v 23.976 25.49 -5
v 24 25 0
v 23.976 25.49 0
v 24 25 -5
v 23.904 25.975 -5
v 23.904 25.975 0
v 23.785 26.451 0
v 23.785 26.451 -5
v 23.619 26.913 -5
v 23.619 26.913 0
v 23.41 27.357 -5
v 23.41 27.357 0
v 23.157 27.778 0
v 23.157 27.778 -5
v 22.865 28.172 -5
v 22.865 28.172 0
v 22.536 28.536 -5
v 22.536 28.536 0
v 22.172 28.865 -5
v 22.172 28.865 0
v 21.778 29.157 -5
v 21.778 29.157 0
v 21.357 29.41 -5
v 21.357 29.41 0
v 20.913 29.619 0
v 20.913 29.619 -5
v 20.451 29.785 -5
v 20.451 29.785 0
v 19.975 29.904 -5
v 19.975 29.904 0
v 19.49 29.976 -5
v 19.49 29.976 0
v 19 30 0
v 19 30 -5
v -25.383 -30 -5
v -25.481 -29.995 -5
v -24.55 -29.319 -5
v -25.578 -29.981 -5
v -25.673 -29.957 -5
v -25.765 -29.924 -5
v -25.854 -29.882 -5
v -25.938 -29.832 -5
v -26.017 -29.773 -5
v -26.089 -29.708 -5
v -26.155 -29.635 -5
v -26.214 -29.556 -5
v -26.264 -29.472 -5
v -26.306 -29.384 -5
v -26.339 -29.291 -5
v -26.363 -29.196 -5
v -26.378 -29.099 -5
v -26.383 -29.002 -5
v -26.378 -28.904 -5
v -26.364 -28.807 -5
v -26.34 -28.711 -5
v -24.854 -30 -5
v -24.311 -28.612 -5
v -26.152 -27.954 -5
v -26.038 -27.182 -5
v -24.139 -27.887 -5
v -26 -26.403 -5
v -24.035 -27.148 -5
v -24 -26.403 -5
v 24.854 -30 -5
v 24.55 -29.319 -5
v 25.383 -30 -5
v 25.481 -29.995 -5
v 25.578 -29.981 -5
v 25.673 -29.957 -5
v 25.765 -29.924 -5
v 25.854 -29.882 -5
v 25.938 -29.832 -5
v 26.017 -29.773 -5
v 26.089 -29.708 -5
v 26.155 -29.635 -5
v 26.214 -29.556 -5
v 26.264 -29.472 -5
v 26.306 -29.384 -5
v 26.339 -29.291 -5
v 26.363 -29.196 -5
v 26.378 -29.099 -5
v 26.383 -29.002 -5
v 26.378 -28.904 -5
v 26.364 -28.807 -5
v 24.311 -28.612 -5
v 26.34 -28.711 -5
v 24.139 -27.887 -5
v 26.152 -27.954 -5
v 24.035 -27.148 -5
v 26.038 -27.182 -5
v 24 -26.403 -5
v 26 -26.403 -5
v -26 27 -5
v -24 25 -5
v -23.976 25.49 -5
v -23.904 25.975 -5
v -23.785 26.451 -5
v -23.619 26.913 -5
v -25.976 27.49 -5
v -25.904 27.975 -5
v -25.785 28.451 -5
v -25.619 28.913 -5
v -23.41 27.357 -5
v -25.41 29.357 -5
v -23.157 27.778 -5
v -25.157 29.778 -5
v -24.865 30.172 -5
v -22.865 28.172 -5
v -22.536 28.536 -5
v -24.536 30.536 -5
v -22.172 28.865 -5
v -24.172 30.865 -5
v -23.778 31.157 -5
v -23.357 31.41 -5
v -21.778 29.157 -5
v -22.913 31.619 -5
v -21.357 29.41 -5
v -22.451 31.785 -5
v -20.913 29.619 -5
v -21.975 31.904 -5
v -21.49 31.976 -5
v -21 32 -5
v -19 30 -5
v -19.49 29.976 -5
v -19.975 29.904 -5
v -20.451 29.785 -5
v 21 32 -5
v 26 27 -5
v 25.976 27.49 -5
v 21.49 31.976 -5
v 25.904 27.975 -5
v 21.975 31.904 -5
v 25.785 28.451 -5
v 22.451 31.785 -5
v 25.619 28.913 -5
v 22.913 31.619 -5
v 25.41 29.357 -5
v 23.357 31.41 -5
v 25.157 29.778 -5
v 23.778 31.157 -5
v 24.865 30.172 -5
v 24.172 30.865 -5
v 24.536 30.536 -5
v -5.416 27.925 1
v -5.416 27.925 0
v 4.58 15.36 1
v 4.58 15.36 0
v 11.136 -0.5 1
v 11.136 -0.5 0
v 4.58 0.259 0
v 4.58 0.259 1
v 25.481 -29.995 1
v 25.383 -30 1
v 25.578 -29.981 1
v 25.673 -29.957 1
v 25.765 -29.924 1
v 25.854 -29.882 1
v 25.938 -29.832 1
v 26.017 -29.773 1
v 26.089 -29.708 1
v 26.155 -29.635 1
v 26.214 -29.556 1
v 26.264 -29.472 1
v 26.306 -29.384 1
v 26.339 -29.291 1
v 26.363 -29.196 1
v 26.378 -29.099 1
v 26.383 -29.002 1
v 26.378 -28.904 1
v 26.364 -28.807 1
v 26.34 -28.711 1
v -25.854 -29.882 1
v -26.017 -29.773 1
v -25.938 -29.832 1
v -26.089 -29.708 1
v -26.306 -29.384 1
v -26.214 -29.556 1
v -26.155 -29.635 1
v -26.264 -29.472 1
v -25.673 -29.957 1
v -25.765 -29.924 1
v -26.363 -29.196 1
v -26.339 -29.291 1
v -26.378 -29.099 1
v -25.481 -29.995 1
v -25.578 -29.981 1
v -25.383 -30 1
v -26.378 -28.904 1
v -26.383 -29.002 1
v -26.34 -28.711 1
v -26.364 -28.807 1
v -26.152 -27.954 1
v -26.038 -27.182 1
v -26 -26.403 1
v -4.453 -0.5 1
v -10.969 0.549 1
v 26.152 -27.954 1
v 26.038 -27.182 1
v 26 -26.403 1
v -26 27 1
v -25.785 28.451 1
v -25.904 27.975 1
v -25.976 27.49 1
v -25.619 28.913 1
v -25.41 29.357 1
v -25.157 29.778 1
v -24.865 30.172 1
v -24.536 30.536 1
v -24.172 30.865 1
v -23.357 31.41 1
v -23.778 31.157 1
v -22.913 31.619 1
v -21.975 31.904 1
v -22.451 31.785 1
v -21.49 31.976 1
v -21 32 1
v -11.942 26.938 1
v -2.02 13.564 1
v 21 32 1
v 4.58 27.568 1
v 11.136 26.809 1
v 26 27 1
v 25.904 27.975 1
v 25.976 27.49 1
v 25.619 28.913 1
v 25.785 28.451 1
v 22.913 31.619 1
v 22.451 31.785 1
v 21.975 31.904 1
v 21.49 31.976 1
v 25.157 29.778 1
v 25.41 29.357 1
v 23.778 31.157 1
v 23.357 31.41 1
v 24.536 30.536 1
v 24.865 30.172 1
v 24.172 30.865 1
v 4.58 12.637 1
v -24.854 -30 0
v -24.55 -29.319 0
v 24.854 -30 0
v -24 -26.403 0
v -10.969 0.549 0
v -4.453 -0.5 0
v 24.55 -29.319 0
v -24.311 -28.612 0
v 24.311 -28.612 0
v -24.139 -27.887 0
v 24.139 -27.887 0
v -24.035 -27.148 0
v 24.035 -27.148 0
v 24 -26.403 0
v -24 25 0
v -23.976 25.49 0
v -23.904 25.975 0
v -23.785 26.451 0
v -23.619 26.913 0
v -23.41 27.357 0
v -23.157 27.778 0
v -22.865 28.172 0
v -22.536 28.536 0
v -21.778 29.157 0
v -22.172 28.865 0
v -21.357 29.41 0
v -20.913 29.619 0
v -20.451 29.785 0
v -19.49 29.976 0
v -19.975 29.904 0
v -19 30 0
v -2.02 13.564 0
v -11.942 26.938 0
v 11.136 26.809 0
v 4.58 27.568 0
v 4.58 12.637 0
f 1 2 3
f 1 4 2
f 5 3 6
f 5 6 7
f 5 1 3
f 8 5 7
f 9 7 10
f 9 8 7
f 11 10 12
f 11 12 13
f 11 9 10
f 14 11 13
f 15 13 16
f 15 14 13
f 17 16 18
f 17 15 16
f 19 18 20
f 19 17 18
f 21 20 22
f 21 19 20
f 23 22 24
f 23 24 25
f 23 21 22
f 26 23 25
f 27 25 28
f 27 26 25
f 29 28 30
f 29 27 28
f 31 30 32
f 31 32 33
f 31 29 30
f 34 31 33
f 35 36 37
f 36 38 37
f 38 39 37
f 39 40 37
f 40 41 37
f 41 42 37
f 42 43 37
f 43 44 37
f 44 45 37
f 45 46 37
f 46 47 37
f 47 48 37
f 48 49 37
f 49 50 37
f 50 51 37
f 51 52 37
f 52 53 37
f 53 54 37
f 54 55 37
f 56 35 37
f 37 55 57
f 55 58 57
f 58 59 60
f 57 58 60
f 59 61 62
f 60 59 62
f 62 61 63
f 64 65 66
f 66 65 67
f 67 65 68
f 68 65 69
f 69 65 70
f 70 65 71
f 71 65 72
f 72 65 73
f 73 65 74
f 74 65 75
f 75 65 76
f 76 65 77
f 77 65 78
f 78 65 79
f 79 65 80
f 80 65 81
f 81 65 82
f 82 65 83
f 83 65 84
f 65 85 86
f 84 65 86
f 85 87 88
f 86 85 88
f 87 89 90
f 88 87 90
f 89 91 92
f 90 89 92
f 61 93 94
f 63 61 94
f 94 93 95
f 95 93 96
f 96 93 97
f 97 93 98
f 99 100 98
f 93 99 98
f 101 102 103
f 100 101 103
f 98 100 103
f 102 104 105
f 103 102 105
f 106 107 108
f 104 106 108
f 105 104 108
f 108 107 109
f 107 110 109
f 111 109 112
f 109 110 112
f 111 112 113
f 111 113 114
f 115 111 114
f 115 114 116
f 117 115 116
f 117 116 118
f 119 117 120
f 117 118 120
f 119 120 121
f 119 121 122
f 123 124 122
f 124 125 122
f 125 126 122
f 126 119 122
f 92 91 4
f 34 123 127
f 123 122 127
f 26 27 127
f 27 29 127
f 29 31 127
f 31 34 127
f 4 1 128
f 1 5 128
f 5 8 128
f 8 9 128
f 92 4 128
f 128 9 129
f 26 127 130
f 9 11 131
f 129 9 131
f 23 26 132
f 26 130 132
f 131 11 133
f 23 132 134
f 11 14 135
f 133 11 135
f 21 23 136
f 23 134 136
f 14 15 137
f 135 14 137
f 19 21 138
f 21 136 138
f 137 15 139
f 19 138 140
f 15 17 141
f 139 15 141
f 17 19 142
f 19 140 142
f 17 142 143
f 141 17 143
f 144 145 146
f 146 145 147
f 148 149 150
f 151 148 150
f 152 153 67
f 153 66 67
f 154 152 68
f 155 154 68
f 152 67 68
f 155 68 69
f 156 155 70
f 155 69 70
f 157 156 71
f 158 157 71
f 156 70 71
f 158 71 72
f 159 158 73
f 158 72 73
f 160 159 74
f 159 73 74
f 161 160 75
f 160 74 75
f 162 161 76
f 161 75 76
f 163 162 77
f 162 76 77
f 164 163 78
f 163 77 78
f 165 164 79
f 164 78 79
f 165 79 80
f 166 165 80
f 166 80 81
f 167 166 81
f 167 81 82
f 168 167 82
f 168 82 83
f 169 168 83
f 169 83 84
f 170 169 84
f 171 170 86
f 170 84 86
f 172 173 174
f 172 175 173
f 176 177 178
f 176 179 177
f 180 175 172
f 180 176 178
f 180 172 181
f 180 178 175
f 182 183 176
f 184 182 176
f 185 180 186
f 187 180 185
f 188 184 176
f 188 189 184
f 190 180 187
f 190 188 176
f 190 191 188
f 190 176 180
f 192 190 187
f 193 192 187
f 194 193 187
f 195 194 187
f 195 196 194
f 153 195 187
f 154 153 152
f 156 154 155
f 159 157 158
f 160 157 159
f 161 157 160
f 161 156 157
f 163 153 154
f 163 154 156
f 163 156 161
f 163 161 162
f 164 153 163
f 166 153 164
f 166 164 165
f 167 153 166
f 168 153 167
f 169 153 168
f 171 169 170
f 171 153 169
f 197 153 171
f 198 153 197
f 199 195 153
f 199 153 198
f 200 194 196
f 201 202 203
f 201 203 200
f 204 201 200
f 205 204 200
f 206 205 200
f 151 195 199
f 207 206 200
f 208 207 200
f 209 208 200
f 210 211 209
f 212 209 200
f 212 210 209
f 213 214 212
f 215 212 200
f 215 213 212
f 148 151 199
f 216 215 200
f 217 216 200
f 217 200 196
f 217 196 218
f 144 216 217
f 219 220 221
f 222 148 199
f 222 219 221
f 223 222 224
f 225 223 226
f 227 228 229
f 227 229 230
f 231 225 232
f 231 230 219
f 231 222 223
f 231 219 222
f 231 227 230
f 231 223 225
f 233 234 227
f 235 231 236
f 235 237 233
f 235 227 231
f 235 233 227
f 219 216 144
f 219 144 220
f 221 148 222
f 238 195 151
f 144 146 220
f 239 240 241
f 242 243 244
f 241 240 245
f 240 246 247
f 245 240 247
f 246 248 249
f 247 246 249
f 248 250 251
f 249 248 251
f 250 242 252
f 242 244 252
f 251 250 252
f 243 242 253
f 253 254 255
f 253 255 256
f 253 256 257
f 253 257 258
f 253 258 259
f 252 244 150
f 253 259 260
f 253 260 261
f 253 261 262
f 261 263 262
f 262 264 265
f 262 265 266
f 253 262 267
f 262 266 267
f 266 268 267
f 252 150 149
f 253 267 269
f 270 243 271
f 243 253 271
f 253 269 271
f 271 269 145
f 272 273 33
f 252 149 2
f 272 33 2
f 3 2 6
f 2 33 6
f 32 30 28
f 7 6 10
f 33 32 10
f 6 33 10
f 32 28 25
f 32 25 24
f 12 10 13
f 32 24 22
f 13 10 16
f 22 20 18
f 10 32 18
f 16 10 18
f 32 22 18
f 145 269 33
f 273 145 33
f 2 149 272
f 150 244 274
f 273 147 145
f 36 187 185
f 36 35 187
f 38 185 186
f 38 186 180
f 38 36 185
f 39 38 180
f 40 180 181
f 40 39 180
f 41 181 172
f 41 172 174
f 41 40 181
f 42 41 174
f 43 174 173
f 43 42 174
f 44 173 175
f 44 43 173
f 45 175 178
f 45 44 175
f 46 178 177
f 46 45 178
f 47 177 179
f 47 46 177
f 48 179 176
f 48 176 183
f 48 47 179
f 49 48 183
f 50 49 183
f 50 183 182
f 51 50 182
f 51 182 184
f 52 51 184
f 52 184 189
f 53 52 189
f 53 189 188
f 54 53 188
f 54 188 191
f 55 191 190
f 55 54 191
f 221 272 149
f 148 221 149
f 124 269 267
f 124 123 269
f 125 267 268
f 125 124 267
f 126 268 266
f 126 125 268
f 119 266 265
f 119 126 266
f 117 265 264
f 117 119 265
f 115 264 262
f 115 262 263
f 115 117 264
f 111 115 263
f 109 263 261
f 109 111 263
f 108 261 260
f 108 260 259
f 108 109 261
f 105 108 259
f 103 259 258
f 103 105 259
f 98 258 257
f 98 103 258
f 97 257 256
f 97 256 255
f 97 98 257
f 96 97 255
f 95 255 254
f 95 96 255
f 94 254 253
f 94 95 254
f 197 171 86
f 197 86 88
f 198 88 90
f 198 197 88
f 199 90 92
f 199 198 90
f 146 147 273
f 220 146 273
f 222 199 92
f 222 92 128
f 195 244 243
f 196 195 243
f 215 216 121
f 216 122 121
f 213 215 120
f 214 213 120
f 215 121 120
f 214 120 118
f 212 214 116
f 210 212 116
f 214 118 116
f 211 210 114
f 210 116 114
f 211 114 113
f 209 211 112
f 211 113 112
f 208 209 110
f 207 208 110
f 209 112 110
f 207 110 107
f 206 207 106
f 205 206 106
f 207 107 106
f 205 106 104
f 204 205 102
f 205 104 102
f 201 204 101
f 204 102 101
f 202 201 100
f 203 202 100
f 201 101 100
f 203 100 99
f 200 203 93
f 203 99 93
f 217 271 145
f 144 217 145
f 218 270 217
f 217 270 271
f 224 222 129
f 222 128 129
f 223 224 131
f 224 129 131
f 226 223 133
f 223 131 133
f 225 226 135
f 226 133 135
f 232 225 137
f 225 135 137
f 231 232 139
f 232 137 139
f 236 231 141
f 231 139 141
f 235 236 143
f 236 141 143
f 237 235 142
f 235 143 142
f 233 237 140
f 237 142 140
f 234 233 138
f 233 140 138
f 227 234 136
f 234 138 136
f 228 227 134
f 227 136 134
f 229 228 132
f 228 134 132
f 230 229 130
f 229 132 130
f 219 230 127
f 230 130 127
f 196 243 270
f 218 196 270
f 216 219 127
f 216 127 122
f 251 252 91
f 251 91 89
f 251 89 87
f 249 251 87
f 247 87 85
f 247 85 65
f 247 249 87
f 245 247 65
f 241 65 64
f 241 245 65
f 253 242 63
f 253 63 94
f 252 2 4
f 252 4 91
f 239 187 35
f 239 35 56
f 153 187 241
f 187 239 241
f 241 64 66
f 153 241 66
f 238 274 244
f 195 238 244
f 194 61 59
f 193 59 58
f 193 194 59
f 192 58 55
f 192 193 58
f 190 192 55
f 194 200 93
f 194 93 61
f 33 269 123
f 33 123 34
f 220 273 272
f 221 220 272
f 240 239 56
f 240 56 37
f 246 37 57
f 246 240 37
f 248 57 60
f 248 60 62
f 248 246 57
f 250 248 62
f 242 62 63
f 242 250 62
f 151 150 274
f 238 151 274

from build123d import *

# Parameters (mm, degrees)
F1_DEPTH = 1
F3_DEPTH = 6
F4_R     = 1
F5_R     = 5
F7_DEPTH = 12.5
F8_SCALE = 1.2


# Not quite as in the source:
# - a feature names something its author has since deleted; it is built from what else it names


with BuildPart() as f1:
    # F0 (on Top) → F1 (new body)
    with BuildSketch(Plane.XY):
        Polygon((24, 30), (-24, 30), (-24, -20.3061967343), (-24, -30), (24, -30), (24, -20.3061967343), align=None)
        Polygon((-24, -30), (-24, -20.3061967343), (-26.5, -30), align=None)
        Polygon((26.5, -30), (24, -20.3061967343), (24, -30), align=None)
    extrude(amount=F1_DEPTH)

    # F2 (on face) → F3 (join)
    with BuildSketch(Plane.XY.offset(1)):
        with BuildLine():
            Line((24, 30), (24, -26.4028457212))
            ThreePointArc((24, -26.4028457212), (24.2165144832, -28.2514541736), (24.8543383025, -30))
            Line((24.8543383025, -30), (26.8543383025, -30))
            ThreePointArc((26.8543383025, -30), (26.2165144832, -28.2514541736), (26, -26.4028457212))
            Line((26, -26.4028457212), (26, 32))
            Line((26, 32), (0, 32))
            Line((0, 32), (-26, 32))
            Line((-26, 32), (-26, -26.4028457212))
            ThreePointArc((-26, -26.4028457212), (-26.2165144832, -28.2514541736), (-26.8543383025, -30))
            Line((-26.8543383025, -30), (-24.8543383025, -30))
            ThreePointArc((-24.8543383025, -30), (-24.2165144832, -28.2514541736), (-24, -26.4028457212))
            Line((-24, -26.4028457212), (-24, 30))
            Line((-24, 30), (0, 30))
            Line((0, 30), (24, 30))
        make_face()
    extrude(amount=-F3_DEPTH)

    # F4
    f4_edges = [f1.edges().sort_by_distance(p)[0] for p in [
        (-26.854338, -30, -2),
        (26.854338, -30, -2),
    ]]
    fillet(f4_edges, radius=F4_R)

    # F5
    f5_edges = [f1.edges().sort_by_distance(p)[0] for p in [
        (24, 30, -2.5),
        (26, 32, -2),
        (-26, 32, -2),
        (-24, 30, -2.5),
    ]]
    fillet(f5_edges, radius=F5_R)


with BuildPart() as f7:
    # F6 (on face) → F7 (new body, symmetric)
    with BuildSketch(Plane(origin=(0, 0, 0), x_dir=(1, 0, 0), z_dir=(0, 0, -1))):
        Polygon((6.3998643309, -23.389915917), (11.8633387856, -22.7571071915), (11.8633387856, 0), (6.3998643309, -0.6328087254), (6.3998643309, -10.9478783381), (6.3998643309, -13.2169965655), align=None)
        Polygon((-1.9300751453, -23.6877743155), (6.3998643309, -13.2169965655), (6.3998643309, -10.9478783381), (-1.1277758749, 0), (-6.5578306463, -0.8743598687), (0.8998643309, -11.7196280624), (-7.3682154656, -22.865199178), align=None)
    extrude(amount=F7_DEPTH, both=True)


with BuildPart() as f7_1:
    # F8: moved
    add(f7.part.scale(F8_SCALE))


with BuildPart() as f7_2:
    # F9: moved
    add(f7_1.part.moved(Location((-3.1, -0.5, 0))))


with BuildPart() as f1_1:
    add(f1.part)

    # F10: cut F7
    add(f7_2.part, mode=Mode.SUBTRACT)


solid = f1_1.part
